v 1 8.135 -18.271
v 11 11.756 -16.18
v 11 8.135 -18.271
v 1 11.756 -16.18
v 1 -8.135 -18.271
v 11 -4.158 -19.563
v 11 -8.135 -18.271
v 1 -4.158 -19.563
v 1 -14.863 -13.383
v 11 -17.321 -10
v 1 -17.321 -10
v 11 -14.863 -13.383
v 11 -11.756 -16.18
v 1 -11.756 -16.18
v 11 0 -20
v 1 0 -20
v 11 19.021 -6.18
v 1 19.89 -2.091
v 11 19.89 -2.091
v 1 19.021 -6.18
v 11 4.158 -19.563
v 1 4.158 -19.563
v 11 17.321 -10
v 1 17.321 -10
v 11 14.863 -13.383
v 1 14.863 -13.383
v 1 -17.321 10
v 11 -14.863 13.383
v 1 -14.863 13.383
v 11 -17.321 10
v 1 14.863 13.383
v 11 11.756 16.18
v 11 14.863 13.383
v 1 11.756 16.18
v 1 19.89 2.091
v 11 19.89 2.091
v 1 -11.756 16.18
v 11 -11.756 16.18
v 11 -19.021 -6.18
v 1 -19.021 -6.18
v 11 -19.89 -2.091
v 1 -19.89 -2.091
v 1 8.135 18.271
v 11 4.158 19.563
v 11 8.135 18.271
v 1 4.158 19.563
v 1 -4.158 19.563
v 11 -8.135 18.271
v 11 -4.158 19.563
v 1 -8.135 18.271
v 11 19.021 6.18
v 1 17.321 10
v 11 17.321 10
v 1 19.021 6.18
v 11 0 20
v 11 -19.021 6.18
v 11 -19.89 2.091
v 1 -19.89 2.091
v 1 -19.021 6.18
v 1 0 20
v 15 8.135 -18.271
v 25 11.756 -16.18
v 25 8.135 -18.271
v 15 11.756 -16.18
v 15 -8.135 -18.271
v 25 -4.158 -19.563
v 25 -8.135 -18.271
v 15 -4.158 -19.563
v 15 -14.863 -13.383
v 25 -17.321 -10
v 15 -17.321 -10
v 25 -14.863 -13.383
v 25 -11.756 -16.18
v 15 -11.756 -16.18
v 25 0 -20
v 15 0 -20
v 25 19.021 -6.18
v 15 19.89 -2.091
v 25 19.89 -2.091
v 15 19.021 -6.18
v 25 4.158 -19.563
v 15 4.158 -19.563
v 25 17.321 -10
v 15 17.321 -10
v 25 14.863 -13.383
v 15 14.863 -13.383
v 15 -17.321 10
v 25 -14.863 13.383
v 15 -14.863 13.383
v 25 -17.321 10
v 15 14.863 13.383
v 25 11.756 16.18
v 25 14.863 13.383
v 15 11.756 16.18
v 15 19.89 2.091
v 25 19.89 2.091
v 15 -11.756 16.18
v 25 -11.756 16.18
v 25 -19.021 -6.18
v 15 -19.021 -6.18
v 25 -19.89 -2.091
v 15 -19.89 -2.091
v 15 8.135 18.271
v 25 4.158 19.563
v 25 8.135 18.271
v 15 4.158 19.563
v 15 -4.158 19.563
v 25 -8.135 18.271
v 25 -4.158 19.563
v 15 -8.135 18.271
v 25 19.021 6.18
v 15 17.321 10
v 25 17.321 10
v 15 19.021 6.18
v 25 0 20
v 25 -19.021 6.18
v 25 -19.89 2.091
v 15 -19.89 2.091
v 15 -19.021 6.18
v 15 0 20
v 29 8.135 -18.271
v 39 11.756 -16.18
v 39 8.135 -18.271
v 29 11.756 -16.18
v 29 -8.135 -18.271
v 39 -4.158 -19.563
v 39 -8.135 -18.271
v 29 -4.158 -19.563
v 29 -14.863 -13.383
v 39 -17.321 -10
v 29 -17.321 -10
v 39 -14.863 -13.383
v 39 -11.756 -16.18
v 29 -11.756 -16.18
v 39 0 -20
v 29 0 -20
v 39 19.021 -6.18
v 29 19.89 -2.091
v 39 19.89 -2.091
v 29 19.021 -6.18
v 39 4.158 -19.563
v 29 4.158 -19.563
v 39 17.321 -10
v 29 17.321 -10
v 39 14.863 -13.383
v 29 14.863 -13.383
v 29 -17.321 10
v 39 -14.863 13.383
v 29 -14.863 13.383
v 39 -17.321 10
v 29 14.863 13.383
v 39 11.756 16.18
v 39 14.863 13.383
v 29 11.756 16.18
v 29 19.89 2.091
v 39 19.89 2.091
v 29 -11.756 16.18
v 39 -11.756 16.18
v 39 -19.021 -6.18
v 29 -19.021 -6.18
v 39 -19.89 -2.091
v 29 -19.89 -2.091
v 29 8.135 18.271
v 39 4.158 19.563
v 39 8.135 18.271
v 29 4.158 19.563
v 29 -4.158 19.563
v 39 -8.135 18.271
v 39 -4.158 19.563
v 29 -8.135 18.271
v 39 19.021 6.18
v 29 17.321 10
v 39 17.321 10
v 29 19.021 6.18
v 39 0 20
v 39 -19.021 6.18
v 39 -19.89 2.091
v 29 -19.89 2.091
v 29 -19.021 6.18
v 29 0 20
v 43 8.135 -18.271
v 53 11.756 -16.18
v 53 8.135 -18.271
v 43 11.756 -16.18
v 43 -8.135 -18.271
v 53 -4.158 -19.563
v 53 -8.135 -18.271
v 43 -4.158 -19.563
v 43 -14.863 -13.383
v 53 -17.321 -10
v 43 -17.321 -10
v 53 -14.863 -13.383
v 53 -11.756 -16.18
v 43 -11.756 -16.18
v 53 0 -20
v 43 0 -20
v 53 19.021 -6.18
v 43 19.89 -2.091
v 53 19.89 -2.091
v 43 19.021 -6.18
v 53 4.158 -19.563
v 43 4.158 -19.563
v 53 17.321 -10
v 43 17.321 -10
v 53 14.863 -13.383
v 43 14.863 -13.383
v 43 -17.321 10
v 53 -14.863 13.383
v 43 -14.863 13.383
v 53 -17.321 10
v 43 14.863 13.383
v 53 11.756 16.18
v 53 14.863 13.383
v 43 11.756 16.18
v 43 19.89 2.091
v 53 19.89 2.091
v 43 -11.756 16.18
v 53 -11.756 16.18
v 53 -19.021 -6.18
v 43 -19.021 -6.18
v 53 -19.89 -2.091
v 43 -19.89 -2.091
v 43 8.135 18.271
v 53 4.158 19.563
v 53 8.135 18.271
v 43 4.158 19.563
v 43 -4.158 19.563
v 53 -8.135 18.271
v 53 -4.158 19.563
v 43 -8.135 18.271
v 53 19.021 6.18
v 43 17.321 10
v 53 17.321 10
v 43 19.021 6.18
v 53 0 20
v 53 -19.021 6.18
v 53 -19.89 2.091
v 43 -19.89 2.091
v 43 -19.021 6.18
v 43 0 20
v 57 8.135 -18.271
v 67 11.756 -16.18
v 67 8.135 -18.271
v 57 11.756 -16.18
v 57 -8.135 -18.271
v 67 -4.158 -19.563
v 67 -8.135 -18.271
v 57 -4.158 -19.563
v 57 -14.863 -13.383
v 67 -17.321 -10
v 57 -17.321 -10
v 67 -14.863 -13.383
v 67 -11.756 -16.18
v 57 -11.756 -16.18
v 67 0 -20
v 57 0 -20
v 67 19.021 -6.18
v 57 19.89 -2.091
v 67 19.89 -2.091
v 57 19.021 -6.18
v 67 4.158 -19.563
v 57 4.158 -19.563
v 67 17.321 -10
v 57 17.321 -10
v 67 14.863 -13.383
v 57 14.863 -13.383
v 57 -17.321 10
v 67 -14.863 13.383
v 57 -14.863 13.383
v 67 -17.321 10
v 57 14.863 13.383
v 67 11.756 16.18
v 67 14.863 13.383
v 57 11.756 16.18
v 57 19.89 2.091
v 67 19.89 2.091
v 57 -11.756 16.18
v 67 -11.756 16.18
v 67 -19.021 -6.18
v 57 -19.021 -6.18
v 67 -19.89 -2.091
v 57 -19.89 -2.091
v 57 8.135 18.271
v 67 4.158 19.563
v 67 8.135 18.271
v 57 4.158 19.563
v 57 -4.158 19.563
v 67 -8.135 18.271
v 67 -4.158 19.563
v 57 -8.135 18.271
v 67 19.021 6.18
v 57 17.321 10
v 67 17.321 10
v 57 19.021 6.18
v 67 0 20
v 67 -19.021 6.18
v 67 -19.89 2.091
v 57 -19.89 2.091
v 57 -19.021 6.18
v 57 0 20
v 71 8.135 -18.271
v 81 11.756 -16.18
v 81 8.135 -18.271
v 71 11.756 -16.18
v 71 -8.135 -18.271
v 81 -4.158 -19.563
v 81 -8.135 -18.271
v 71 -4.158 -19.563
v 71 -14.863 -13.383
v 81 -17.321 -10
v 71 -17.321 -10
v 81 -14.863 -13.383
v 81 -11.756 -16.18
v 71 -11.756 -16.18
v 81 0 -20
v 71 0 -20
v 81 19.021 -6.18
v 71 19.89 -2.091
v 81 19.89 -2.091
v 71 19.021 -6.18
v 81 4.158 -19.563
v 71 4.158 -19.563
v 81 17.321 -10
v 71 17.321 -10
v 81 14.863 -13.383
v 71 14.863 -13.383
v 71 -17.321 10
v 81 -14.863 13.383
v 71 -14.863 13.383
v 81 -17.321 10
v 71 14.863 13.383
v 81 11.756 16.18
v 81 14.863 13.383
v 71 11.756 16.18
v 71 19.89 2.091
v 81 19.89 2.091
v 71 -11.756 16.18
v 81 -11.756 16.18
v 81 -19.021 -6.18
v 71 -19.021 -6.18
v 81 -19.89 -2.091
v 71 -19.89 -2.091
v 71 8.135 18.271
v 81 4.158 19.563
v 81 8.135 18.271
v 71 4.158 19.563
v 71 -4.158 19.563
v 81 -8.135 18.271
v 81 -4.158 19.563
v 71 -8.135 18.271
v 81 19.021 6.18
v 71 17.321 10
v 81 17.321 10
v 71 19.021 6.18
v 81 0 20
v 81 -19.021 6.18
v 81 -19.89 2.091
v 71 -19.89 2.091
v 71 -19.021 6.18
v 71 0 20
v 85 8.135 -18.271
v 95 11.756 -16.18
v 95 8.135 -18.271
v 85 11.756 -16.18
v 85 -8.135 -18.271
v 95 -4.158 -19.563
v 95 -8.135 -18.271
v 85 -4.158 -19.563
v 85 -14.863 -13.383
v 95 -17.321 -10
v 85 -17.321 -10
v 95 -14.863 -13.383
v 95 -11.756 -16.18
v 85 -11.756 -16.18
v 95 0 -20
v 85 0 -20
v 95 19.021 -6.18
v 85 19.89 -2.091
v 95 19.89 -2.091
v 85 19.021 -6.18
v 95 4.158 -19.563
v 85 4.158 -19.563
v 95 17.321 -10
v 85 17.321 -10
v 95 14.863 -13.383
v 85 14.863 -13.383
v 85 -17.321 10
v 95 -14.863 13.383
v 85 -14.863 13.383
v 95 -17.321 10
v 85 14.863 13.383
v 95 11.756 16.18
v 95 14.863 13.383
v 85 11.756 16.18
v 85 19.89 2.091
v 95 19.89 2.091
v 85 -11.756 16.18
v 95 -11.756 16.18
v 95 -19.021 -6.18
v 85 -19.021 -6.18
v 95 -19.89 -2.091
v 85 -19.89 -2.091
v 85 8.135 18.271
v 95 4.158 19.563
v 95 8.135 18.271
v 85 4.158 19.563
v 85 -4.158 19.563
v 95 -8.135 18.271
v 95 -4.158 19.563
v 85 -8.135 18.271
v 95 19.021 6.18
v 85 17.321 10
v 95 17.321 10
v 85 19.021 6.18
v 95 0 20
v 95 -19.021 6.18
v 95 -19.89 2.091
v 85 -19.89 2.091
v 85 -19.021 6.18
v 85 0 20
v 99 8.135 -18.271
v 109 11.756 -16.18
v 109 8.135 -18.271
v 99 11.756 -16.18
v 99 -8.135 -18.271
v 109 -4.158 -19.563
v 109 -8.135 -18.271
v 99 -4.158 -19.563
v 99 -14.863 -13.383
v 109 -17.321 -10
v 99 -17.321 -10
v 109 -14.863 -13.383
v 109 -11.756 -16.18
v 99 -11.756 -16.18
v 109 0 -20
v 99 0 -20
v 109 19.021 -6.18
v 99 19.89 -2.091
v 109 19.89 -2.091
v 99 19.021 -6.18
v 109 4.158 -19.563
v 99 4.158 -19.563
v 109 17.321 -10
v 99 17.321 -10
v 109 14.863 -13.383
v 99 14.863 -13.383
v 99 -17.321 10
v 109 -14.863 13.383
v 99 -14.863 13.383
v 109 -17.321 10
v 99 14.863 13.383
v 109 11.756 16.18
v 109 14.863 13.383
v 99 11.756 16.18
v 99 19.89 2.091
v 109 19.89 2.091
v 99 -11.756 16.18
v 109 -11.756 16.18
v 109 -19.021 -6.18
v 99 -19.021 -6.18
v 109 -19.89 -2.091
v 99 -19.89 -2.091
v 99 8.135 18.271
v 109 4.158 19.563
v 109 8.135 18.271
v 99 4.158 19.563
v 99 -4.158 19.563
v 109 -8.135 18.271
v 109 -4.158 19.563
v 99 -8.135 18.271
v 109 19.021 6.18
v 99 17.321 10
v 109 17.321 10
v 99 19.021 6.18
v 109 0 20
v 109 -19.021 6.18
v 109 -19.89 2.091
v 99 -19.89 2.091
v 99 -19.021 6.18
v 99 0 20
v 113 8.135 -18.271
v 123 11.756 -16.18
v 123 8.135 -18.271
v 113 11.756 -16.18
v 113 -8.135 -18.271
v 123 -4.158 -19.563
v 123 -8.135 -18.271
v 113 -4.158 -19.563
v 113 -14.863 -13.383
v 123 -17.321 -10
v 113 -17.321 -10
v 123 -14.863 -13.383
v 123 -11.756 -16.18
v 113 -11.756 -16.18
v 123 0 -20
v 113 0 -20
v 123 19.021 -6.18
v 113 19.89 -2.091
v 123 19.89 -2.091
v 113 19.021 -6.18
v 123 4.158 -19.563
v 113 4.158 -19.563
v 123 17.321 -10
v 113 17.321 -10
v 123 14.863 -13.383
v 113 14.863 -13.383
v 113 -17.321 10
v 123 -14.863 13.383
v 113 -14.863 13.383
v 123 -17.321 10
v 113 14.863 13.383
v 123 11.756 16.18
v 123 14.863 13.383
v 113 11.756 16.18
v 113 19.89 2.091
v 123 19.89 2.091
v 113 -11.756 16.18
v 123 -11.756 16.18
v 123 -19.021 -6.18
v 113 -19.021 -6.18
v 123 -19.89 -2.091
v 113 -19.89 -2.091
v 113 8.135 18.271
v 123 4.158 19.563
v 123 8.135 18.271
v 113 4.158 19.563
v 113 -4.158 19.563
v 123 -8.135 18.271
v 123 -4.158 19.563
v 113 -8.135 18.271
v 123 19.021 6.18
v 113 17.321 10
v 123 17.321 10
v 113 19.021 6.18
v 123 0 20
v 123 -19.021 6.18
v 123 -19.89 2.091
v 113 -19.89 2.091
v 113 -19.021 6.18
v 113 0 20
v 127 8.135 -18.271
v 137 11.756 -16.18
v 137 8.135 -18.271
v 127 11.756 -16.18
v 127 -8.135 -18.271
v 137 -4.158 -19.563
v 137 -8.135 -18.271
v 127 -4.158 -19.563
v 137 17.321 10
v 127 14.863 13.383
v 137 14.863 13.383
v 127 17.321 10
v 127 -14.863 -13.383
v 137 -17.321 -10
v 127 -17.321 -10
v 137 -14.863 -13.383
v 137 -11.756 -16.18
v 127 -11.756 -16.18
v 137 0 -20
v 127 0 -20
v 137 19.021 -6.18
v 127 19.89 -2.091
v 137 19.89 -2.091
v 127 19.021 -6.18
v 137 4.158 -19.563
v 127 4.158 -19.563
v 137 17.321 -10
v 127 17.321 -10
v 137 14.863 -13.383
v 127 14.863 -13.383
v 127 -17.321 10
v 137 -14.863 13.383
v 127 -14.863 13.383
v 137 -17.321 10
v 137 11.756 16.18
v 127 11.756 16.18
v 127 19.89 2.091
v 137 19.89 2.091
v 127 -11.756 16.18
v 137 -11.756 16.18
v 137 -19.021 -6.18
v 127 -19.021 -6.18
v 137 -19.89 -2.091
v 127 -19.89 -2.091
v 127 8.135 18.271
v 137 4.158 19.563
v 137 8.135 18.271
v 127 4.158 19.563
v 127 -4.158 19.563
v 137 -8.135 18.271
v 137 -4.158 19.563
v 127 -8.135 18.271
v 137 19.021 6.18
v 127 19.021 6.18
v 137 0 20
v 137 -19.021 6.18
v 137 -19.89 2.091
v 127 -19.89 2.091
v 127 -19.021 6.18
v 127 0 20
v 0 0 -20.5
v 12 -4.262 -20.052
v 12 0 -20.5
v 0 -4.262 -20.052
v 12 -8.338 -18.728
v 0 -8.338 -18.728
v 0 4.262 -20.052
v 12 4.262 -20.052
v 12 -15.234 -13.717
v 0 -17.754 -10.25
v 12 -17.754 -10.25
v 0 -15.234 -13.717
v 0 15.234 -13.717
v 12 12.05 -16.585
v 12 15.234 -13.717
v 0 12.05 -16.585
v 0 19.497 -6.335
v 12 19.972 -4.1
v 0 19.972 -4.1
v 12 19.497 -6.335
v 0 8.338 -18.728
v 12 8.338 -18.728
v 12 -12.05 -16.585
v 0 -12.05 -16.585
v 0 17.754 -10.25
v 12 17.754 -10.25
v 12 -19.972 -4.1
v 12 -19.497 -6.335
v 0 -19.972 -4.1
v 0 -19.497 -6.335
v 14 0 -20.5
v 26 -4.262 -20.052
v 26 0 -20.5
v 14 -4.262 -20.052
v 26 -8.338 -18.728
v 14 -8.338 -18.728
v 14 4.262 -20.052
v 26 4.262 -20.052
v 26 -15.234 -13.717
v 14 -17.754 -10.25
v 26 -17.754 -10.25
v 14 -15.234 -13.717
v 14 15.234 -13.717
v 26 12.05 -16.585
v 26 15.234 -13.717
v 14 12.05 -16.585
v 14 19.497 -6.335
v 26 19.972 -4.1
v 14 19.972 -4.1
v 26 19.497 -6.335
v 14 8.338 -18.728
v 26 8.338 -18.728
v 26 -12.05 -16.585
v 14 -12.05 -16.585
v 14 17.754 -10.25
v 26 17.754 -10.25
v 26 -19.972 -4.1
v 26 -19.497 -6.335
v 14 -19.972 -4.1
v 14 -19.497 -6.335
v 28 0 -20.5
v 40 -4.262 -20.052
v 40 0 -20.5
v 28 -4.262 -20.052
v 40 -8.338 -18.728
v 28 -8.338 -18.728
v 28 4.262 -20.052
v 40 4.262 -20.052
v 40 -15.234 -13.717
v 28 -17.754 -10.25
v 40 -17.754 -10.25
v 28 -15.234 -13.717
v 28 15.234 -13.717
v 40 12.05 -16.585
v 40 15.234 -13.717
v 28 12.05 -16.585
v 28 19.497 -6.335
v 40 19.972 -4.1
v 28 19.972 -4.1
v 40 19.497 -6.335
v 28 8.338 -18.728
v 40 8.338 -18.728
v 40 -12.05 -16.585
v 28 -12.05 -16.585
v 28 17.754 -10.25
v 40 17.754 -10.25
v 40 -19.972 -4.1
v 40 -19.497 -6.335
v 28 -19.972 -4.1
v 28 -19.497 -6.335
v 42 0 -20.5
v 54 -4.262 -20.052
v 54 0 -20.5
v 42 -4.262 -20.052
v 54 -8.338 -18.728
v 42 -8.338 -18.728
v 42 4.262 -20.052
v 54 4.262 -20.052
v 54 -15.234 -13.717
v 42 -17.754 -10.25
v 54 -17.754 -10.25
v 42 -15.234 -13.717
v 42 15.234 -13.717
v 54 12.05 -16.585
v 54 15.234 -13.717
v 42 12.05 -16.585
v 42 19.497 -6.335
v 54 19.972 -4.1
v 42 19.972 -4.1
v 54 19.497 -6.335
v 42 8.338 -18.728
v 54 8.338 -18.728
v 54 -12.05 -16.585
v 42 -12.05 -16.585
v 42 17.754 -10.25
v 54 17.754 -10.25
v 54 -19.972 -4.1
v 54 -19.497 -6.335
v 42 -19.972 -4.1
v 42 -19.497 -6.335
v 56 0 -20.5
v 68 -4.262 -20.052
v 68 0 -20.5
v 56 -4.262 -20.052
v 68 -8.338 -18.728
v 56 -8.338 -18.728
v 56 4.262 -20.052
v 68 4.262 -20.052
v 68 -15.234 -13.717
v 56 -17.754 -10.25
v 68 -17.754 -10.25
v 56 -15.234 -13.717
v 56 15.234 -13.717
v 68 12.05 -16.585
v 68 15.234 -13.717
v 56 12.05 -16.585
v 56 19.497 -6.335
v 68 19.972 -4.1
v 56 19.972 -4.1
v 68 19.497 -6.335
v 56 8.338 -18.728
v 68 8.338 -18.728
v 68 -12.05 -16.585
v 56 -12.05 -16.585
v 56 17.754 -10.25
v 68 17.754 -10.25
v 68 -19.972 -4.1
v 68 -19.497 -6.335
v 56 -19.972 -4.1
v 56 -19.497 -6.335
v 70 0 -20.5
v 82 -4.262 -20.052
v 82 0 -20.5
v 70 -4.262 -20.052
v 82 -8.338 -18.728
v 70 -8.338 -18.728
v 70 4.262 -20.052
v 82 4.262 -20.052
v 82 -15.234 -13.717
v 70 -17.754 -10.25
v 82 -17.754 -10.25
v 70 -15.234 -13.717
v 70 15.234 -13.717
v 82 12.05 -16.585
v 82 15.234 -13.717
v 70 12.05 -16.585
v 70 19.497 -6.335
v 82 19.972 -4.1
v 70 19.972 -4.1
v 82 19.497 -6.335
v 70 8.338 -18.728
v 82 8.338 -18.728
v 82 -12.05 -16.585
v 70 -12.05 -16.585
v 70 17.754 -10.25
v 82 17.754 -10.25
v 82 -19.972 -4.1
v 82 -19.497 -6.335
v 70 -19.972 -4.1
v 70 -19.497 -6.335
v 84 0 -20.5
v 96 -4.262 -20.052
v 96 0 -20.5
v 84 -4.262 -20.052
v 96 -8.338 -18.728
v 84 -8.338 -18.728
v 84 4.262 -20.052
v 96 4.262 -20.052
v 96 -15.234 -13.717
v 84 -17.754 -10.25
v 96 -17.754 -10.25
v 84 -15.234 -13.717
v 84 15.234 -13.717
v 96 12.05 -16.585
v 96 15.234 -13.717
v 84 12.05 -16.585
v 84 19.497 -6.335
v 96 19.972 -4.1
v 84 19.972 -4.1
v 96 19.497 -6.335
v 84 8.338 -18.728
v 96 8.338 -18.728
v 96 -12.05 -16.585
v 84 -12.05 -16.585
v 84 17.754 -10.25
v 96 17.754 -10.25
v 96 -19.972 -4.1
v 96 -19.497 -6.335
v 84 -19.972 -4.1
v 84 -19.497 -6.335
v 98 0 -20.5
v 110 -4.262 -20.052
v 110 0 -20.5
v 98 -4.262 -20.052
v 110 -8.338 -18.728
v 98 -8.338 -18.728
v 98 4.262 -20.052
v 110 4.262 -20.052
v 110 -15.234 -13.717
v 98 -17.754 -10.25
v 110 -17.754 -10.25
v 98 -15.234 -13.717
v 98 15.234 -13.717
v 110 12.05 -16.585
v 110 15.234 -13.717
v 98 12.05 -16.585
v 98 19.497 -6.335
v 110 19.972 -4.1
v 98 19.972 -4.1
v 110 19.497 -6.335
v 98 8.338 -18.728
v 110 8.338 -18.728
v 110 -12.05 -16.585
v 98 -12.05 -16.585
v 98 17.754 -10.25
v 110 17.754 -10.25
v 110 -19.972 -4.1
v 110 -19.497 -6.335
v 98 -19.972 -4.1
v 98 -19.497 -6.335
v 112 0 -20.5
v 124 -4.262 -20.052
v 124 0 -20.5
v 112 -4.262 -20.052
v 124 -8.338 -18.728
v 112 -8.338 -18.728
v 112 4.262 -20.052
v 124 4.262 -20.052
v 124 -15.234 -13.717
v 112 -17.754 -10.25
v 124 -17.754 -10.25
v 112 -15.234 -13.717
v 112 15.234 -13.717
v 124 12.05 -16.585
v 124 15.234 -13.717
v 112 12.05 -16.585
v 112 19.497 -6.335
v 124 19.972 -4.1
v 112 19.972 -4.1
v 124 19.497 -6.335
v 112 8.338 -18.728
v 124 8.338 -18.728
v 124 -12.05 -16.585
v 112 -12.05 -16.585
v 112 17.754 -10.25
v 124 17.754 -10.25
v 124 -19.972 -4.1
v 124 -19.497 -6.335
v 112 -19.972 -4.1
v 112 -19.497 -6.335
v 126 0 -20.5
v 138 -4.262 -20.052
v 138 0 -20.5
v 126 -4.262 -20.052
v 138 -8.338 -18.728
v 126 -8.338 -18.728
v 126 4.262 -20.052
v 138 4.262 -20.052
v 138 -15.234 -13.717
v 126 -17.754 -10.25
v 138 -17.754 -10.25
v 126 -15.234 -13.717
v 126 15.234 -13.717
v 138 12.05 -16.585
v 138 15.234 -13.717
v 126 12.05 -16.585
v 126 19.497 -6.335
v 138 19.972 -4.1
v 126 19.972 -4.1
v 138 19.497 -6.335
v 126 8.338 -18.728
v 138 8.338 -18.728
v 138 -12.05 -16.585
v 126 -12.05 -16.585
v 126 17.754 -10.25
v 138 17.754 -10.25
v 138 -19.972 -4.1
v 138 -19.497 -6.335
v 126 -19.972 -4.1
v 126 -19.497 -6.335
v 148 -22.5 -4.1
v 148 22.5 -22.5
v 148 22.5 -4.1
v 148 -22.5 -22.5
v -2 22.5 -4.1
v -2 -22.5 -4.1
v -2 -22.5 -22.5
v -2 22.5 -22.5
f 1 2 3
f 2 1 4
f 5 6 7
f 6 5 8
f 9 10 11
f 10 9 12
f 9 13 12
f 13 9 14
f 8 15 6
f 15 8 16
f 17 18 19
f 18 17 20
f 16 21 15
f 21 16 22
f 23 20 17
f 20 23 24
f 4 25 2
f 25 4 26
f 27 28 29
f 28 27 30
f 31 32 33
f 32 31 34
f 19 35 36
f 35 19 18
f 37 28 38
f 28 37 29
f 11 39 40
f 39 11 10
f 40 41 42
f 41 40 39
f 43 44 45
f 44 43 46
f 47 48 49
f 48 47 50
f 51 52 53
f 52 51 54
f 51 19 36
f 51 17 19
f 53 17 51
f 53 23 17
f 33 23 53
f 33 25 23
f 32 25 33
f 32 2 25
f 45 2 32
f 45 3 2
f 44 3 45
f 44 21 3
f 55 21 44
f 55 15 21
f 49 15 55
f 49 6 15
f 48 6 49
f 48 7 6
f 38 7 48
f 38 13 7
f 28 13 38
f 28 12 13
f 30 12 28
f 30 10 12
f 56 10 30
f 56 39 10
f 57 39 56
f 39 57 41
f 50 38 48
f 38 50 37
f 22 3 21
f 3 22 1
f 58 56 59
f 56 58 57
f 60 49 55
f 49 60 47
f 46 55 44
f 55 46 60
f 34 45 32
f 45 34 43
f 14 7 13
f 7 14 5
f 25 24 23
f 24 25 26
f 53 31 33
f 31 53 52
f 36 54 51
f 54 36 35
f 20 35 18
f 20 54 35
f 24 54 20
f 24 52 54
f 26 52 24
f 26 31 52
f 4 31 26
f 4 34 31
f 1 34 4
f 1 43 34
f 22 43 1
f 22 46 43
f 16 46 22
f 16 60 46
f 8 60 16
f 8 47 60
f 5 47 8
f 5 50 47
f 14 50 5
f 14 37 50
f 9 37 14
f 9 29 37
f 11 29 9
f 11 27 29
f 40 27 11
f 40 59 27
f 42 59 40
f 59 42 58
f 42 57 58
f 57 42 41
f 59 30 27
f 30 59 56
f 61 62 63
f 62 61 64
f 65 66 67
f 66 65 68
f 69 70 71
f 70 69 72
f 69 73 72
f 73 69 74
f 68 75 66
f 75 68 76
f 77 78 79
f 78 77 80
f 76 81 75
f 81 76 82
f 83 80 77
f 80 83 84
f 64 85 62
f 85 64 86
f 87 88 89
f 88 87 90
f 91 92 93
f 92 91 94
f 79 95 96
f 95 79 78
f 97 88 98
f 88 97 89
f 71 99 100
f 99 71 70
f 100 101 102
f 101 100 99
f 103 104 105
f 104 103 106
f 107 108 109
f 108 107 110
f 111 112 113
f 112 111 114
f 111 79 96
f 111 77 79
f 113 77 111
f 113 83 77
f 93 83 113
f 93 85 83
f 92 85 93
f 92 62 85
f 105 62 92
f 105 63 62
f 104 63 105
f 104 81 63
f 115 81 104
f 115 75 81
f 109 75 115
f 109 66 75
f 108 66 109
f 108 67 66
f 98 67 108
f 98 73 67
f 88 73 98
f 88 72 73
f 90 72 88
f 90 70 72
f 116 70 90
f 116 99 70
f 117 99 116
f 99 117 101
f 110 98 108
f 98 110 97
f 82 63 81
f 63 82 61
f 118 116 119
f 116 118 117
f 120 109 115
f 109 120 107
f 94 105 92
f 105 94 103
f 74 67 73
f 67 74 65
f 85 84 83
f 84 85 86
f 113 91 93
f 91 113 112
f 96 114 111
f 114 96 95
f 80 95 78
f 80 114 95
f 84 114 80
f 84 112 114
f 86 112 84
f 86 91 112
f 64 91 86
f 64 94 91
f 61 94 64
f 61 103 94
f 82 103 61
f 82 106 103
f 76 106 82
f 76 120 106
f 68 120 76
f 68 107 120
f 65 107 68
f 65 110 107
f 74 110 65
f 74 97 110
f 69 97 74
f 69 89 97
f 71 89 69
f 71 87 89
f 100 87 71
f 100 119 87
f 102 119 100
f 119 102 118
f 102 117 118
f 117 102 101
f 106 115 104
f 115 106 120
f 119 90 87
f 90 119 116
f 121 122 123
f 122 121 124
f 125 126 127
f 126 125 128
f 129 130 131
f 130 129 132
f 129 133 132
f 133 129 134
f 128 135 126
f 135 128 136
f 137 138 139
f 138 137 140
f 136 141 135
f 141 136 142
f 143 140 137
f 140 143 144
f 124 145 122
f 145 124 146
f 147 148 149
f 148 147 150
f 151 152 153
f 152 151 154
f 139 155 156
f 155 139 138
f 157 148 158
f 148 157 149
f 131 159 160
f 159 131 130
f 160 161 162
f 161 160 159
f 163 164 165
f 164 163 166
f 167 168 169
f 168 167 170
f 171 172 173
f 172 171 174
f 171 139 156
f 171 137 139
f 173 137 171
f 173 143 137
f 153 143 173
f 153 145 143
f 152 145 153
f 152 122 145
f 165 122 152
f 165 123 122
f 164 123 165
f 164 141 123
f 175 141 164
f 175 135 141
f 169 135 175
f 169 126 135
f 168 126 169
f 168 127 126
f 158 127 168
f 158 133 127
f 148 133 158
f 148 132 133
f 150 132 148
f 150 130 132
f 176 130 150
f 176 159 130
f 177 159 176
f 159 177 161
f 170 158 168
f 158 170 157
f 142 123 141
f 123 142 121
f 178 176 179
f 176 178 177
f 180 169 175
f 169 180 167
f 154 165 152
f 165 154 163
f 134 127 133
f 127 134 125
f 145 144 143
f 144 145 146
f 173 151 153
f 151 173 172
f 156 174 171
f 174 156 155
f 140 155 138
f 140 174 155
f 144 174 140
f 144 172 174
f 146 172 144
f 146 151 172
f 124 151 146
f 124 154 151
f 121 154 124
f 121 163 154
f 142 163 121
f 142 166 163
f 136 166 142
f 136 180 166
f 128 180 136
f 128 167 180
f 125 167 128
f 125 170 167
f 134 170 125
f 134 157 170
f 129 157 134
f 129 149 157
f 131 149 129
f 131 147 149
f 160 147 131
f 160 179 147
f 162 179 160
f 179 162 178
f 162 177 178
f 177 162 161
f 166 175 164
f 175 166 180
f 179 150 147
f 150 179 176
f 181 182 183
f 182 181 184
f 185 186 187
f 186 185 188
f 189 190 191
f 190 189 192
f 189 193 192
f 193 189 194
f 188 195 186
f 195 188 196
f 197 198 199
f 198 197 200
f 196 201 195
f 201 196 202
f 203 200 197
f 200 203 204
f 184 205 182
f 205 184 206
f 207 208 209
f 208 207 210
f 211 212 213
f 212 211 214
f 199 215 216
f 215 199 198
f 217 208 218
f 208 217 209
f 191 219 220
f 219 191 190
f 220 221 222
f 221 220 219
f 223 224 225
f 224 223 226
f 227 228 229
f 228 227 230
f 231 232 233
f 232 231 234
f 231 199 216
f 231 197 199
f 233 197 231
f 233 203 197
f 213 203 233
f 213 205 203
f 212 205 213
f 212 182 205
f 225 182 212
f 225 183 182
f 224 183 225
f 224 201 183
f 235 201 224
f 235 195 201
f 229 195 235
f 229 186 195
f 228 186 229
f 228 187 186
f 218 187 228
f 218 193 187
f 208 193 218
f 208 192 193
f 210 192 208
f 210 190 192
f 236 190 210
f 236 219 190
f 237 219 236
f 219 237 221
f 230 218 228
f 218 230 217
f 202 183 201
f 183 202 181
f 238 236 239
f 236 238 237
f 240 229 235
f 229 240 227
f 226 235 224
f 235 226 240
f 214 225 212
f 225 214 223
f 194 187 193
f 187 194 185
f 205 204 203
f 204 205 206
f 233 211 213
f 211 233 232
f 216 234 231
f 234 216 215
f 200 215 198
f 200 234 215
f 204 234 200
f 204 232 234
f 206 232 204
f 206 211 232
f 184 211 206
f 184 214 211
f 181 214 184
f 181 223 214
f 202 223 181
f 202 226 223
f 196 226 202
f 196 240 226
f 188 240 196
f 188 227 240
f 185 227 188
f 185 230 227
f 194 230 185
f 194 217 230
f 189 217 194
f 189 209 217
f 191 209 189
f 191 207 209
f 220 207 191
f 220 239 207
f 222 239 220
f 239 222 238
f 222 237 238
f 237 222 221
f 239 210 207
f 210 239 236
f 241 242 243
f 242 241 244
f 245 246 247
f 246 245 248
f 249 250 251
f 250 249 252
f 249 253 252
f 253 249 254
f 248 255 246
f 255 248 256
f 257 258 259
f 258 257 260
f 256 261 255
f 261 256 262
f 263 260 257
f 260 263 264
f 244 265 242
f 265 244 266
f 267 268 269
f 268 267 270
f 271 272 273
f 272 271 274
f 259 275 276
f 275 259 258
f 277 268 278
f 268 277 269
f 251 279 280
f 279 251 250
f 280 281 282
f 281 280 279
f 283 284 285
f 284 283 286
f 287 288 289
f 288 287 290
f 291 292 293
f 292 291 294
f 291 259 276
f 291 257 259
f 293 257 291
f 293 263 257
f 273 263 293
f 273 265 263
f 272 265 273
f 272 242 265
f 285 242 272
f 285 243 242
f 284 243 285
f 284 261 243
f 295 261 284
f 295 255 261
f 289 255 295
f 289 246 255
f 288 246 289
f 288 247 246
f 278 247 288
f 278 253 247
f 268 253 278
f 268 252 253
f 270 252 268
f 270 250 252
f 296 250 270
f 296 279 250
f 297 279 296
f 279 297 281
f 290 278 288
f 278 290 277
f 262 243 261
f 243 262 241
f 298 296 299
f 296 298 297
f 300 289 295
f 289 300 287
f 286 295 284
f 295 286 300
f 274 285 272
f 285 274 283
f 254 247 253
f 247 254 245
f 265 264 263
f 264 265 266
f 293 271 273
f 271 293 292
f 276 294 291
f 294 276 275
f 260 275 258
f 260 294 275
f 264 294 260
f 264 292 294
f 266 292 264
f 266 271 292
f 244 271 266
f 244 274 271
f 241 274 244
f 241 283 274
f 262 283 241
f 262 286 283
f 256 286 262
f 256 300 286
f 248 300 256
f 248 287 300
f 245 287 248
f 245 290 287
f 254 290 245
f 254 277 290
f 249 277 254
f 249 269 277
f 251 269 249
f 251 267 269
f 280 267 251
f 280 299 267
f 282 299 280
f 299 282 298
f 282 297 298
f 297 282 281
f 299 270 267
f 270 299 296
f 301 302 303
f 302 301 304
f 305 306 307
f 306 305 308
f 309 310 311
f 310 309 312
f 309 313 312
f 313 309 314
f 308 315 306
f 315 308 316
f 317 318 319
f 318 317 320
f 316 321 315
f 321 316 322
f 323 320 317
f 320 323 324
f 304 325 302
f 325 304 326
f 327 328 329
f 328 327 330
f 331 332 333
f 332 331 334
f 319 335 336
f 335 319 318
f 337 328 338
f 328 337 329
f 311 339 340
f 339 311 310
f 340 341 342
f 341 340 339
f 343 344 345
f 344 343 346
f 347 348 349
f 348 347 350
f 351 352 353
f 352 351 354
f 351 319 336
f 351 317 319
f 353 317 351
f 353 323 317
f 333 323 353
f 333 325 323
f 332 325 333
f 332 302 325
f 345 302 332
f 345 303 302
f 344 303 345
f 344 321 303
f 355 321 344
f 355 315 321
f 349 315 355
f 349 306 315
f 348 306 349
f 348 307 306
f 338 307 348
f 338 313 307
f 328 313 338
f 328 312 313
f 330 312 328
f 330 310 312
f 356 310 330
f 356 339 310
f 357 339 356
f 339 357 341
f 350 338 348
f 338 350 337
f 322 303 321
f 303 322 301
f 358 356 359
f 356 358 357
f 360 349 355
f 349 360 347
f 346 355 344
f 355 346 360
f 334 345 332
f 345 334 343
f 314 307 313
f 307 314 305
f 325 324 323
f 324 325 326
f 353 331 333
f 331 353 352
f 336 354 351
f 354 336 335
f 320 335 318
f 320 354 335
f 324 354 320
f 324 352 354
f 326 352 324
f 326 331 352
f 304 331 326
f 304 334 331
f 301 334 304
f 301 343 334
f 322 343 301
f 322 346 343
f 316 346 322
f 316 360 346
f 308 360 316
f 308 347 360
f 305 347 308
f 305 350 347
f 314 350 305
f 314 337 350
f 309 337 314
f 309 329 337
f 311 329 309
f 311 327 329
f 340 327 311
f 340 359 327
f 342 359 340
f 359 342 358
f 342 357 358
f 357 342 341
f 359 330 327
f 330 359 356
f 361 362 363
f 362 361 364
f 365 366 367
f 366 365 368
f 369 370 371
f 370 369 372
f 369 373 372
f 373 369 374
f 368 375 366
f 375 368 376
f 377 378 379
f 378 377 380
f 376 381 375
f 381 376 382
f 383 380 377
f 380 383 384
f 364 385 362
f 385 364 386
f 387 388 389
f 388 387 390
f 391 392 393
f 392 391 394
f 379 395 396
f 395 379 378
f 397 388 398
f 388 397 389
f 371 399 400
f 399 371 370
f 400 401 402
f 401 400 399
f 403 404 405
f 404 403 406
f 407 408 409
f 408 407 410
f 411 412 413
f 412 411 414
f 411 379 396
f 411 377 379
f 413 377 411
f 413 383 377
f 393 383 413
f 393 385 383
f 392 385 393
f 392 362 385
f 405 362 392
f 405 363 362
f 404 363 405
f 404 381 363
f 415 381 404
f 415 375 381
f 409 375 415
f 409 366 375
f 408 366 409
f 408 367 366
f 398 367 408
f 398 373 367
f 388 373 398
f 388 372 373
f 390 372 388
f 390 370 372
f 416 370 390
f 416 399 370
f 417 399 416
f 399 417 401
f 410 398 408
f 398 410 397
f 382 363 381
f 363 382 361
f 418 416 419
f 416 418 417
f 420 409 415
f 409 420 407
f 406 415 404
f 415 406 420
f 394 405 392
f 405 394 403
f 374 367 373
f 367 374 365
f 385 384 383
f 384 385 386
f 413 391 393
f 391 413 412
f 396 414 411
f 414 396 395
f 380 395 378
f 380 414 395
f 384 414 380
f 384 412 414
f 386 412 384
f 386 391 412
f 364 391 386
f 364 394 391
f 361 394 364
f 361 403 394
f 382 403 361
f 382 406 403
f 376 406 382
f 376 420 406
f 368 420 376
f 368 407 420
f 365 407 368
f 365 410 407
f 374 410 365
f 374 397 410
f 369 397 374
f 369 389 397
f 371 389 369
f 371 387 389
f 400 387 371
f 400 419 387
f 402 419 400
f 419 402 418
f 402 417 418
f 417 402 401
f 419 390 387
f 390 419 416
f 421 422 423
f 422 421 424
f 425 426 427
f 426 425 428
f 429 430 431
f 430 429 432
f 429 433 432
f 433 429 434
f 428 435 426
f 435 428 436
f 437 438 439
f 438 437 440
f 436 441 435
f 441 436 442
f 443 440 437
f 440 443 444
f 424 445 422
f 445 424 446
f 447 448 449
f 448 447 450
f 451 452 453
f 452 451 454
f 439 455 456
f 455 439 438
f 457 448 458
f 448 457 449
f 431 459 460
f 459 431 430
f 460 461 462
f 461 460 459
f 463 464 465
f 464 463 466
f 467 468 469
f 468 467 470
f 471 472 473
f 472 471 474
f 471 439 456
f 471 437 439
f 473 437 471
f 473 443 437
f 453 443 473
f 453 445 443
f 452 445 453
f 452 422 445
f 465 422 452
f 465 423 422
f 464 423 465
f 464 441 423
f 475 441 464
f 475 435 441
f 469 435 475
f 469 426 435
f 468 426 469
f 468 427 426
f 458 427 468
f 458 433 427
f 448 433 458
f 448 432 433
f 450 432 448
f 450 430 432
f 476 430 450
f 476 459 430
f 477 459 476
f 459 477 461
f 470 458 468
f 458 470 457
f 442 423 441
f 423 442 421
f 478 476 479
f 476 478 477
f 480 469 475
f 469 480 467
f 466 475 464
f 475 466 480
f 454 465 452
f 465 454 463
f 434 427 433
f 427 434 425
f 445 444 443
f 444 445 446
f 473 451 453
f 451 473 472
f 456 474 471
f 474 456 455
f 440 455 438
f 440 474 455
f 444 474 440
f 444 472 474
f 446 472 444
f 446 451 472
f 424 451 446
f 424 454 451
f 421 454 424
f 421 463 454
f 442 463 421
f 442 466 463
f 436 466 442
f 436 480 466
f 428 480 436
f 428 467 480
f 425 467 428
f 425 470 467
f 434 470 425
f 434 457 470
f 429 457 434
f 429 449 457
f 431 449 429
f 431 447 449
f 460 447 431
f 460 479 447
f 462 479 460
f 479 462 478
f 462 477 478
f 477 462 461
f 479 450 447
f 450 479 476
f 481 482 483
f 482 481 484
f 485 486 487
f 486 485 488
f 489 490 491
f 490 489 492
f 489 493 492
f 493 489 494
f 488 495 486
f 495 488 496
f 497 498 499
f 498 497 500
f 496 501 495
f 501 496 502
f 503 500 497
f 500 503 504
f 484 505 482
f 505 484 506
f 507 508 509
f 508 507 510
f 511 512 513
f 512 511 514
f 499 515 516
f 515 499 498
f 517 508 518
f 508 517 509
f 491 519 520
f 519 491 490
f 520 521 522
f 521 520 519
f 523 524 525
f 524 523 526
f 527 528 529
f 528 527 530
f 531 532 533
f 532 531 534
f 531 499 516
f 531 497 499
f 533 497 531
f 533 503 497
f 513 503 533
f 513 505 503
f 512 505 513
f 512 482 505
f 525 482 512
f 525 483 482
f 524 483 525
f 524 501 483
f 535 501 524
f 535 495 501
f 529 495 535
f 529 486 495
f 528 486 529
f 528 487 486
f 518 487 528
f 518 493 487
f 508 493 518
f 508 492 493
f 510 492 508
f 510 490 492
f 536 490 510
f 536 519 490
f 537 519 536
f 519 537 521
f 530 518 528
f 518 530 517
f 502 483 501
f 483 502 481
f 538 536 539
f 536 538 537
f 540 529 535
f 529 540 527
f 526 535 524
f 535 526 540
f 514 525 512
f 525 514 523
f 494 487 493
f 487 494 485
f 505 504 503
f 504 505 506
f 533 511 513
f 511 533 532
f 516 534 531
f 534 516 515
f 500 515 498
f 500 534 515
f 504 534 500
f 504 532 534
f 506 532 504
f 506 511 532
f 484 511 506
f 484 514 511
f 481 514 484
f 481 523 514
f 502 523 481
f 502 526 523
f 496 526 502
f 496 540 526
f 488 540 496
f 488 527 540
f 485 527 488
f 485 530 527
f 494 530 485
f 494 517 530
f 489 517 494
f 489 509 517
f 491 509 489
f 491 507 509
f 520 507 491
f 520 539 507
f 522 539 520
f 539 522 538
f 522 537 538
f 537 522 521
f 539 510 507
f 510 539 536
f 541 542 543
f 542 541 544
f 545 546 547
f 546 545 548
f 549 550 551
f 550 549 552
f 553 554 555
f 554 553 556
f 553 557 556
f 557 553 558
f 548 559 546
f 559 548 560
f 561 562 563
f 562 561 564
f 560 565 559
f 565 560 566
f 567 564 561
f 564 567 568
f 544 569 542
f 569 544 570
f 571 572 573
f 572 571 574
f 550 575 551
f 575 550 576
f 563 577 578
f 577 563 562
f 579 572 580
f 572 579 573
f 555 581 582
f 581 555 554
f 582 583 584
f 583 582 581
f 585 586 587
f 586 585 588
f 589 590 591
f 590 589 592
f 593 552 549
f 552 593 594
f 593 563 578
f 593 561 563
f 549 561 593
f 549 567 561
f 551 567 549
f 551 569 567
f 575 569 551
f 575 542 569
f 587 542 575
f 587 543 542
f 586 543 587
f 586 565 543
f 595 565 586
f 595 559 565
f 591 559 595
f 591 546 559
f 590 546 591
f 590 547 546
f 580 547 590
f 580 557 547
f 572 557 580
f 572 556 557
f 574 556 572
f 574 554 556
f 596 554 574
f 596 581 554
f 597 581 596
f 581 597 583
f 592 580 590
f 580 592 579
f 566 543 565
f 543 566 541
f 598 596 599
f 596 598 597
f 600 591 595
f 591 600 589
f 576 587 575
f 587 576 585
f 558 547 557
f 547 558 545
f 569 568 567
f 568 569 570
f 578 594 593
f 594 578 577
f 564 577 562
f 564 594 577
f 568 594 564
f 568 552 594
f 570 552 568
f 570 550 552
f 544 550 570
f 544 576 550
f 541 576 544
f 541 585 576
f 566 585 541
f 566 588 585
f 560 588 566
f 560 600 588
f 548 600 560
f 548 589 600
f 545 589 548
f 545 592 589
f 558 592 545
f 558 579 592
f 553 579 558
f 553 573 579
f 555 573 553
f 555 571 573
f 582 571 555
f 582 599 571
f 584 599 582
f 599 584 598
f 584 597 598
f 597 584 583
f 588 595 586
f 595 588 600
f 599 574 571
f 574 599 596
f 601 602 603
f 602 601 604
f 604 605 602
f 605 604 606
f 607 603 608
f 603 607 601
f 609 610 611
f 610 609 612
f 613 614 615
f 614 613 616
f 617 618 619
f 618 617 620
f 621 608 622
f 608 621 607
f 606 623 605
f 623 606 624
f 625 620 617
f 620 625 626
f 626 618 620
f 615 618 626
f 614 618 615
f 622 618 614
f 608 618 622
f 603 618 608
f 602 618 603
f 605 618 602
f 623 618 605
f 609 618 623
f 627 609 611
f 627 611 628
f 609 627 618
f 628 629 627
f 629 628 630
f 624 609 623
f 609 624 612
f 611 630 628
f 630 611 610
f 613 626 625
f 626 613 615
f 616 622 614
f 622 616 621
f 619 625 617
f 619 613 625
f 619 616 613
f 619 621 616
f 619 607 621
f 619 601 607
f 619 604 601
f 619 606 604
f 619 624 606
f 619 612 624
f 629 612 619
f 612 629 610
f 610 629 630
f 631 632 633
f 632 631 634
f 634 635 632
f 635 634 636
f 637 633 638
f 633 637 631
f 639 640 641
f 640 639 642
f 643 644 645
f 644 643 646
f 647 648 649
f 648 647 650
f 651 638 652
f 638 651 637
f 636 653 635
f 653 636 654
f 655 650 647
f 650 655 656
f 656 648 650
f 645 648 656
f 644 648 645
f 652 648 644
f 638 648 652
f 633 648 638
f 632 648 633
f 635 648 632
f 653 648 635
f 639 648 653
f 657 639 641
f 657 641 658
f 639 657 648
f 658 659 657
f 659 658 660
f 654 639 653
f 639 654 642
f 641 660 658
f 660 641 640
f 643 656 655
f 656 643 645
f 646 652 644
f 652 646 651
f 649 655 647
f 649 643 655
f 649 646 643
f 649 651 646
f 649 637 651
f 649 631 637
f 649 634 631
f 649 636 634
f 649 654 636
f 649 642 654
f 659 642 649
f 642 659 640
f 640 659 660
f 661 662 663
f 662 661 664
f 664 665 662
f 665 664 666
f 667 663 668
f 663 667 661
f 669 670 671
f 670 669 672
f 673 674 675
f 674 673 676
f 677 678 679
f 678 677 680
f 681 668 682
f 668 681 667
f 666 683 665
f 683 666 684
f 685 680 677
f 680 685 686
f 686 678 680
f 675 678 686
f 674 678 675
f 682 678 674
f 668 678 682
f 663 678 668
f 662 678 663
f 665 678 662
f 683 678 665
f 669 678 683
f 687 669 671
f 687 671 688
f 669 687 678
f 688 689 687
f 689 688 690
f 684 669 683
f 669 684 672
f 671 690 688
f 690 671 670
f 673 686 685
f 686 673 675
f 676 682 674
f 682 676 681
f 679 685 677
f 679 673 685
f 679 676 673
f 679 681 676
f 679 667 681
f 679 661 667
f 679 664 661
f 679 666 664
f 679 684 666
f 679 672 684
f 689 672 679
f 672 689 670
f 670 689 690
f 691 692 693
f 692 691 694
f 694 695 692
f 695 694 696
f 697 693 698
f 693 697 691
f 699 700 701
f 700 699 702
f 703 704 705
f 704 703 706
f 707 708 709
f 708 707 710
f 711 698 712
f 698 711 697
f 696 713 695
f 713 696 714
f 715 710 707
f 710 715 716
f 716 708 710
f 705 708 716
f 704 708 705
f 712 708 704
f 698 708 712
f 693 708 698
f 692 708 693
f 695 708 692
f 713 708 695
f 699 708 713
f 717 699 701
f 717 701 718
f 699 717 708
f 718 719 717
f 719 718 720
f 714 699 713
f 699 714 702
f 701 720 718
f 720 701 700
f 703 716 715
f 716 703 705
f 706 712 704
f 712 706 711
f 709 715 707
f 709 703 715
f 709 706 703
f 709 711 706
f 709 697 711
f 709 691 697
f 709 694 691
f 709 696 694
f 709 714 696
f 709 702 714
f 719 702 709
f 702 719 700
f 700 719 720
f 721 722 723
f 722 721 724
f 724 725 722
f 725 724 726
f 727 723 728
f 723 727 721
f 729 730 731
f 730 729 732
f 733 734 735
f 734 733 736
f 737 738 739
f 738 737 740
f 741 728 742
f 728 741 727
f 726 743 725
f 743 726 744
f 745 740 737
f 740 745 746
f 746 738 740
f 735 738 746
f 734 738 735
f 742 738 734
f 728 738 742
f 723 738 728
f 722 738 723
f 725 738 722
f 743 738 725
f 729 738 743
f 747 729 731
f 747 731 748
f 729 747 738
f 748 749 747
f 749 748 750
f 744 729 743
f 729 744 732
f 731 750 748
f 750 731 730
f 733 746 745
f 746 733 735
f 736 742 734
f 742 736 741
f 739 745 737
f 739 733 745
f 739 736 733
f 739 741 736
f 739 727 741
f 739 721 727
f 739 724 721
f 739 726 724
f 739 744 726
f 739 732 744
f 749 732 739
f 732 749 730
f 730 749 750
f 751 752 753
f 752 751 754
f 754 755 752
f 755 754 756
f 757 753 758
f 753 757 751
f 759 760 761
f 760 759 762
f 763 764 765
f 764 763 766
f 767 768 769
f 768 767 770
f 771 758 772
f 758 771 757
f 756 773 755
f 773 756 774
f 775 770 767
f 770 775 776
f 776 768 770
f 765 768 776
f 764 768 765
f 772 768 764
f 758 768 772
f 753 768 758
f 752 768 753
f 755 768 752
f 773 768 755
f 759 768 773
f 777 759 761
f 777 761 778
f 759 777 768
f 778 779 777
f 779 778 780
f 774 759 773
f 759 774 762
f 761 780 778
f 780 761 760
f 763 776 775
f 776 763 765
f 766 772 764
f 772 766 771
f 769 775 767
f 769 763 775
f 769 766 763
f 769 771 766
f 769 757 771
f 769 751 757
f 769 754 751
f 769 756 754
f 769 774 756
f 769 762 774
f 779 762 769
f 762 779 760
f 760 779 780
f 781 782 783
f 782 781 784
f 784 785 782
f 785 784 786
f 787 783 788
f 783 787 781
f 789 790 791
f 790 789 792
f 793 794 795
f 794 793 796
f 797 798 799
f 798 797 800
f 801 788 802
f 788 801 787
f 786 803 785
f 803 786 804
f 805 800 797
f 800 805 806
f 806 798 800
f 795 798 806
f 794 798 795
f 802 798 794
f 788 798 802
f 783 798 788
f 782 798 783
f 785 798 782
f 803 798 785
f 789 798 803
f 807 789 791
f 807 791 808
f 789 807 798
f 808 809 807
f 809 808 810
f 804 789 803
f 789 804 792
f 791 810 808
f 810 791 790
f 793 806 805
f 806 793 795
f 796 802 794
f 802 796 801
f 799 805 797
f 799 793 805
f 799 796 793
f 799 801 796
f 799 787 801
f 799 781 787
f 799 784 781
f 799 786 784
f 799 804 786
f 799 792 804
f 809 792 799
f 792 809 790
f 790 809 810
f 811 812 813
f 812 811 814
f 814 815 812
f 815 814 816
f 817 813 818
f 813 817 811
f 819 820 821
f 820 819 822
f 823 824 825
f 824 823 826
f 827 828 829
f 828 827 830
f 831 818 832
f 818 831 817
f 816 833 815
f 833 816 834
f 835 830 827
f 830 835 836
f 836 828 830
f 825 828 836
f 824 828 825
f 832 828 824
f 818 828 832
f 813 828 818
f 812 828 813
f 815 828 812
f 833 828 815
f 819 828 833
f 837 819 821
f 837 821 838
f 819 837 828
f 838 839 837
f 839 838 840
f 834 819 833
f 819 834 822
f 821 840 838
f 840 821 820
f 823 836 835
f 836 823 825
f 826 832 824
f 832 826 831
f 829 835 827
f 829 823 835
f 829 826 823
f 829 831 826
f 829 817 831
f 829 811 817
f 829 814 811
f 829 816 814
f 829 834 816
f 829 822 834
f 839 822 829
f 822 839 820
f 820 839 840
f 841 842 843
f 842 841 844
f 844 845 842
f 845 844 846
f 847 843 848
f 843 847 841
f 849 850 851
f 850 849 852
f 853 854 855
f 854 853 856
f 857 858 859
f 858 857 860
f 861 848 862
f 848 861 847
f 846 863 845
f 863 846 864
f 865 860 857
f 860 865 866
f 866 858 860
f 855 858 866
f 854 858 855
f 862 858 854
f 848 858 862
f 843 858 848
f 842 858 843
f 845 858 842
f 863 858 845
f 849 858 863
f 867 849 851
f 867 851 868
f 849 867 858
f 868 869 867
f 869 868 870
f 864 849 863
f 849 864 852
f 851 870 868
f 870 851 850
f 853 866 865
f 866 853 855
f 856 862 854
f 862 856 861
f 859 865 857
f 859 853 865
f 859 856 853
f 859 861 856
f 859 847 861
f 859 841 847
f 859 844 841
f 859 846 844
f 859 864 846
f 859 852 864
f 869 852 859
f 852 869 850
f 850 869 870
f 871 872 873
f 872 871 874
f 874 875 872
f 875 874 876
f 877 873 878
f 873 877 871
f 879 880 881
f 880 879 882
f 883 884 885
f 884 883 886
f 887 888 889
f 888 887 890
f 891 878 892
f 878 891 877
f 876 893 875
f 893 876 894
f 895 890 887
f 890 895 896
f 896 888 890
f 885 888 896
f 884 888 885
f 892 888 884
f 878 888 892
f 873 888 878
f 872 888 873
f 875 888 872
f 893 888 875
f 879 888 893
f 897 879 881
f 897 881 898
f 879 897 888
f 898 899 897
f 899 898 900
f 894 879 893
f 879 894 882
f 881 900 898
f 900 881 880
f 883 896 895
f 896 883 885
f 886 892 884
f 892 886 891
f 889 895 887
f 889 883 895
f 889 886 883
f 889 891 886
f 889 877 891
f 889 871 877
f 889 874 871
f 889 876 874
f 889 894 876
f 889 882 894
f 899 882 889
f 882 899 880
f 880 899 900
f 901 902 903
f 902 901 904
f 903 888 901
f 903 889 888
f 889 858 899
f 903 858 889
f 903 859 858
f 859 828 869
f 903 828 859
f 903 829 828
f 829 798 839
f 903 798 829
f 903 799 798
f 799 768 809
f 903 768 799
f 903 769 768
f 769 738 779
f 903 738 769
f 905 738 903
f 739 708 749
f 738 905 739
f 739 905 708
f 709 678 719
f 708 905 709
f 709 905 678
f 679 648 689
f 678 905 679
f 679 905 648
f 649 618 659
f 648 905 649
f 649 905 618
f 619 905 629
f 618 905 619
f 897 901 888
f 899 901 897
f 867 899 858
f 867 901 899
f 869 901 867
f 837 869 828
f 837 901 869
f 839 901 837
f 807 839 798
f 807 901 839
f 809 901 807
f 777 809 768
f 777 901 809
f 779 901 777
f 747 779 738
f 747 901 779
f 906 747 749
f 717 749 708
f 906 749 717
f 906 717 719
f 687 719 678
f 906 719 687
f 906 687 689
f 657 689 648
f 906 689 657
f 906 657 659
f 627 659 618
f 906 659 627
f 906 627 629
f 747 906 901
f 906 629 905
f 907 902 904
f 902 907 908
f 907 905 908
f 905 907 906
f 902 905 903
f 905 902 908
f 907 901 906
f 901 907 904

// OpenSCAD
/* Small Wish Wheel tray */

// Overall length of the tray.
length = 150;

// Size of the to store
caddy_diameter = 40;
caddy_thickness = 10;

// Way up the caddy to have walls
caddy_held = 0.4;


// Spacing around the caddies
caddy_padding = 1;
wall_thickness = 2;

// Calculate the size of the slots
slot_diameter = caddy_diameter + caddy_padding;
slot_thickness = caddy_thickness + 2 * caddy_padding;

// Work out the number of slots based on the length
total_slots = (length - wall_thickness) / (slot_thickness + wall_thickness);

slots = floor(total_slots);

overall_width = slot_diameter * caddy_held + wall_thickness;

echo("Size:  ", length, overall_width);
echo("Slots: ", slots);



// Reference Caddys
color("White")
    for(i=[0:slots-1])
        translate([i * (slot_thickness + wall_thickness) + caddy_padding,0,0,])
            rotate([0, 90, 0])
                cylinder(h=caddy_thickness, d=caddy_diameter);
    
// Tray
difference() {
    
    // The base of the tray
    translate(
        [-wall_thickness, 
        -(slot_diameter / 2 + wall_thickness), 
        -(slot_diameter / 2 + wall_thickness)])
            cube([
                length, 
                slot_diameter + wall_thickness * 2, 
                overall_width]);
    
    // Slots for the 'wheels'
    for(i=[0:slots-1])
        translate([i * (slot_thickness + wall_thickness),0,0])
            rotate([0, 90, 0])
                cylinder(h=slot_thickness, d=slot_diameter);
}
